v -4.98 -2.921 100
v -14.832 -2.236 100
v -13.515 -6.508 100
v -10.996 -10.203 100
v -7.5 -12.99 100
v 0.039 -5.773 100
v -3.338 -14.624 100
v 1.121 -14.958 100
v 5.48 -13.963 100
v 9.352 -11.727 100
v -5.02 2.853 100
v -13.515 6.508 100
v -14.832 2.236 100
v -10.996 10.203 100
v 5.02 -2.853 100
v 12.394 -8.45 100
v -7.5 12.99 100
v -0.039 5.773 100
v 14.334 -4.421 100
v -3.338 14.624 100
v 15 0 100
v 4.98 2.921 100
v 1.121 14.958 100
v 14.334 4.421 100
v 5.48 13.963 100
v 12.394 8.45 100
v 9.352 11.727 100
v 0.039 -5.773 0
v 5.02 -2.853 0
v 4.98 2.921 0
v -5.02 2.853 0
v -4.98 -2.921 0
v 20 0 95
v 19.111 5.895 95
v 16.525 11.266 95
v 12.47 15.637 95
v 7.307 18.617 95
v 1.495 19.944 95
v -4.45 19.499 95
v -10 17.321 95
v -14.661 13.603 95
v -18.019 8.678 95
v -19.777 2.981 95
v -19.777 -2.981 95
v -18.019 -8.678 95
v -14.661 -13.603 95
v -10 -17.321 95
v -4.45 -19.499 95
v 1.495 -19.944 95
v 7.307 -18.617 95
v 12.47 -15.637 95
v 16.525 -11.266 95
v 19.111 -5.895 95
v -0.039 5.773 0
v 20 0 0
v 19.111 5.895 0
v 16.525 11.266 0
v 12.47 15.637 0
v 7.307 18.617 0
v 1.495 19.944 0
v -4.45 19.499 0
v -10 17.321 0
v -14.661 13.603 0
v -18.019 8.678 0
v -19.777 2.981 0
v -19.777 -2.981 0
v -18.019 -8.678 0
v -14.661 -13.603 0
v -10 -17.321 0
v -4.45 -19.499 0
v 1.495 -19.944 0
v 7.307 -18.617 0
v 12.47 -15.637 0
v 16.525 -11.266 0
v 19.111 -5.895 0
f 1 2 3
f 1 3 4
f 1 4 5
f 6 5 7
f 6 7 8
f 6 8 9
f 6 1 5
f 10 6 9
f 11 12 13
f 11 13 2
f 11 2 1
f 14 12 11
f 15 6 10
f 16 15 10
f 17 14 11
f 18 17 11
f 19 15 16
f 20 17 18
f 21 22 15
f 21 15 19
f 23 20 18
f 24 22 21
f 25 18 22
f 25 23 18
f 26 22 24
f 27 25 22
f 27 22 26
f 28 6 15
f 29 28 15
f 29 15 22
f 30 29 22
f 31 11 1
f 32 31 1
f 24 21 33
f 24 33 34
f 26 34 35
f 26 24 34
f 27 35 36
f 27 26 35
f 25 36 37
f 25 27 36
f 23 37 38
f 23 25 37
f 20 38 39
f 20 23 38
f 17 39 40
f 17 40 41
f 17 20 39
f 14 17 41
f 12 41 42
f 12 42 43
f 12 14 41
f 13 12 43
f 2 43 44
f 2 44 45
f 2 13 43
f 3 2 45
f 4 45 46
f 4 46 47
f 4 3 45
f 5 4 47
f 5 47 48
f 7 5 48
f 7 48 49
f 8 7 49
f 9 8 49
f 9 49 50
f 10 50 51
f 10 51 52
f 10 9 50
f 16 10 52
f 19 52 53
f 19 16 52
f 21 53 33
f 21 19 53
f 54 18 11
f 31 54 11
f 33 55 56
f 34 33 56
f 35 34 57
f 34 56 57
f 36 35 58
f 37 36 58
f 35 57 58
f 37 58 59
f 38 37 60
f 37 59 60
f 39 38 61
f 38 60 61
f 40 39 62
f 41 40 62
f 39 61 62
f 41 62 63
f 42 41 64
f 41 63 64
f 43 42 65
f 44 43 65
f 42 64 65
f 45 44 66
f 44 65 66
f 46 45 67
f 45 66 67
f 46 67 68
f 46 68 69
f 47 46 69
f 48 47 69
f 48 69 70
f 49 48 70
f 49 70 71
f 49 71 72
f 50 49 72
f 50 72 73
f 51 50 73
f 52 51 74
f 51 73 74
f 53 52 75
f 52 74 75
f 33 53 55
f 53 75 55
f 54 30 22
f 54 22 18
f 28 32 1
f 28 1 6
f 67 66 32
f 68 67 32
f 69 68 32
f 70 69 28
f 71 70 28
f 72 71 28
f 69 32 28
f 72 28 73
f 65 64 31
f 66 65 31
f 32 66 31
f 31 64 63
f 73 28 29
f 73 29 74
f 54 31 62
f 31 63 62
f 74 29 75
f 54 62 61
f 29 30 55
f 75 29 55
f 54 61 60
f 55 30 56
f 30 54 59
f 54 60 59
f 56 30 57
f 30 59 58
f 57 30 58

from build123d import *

# Parameters (mm, degrees)
F0_R     = 20
F1_DEPTH = 100
F2_SIZE  = 5
F4_DEPTH = 100.001


with BuildPart() as f1:
    # F0 (on Top) → F1 (new body)
    with BuildSketch(Plane.XY):
        Circle(F0_R)
    extrude(amount=F1_DEPTH)

    # F2
    f2_edges = [f1.edges().sort_by_distance(p)[0] for p in [
        (-20, 0, 100),
    ]]
    chamfer(f2_edges, length=F2_SIZE)

    # F3 (on face) → F4 (cut, through all)
    with BuildSketch(Plane.XY.offset(100)):
        Polygon((0.03937, -5.773368), (5.019569, -2.852589), (4.980199, 2.920779), (-0.03937, 5.773368), (-5.019569, 2.852589), (-4.980199, -2.920779), align=None)
    extrude(amount=-F4_DEPTH, mode=Mode.SUBTRACT)


solid = f1.part
